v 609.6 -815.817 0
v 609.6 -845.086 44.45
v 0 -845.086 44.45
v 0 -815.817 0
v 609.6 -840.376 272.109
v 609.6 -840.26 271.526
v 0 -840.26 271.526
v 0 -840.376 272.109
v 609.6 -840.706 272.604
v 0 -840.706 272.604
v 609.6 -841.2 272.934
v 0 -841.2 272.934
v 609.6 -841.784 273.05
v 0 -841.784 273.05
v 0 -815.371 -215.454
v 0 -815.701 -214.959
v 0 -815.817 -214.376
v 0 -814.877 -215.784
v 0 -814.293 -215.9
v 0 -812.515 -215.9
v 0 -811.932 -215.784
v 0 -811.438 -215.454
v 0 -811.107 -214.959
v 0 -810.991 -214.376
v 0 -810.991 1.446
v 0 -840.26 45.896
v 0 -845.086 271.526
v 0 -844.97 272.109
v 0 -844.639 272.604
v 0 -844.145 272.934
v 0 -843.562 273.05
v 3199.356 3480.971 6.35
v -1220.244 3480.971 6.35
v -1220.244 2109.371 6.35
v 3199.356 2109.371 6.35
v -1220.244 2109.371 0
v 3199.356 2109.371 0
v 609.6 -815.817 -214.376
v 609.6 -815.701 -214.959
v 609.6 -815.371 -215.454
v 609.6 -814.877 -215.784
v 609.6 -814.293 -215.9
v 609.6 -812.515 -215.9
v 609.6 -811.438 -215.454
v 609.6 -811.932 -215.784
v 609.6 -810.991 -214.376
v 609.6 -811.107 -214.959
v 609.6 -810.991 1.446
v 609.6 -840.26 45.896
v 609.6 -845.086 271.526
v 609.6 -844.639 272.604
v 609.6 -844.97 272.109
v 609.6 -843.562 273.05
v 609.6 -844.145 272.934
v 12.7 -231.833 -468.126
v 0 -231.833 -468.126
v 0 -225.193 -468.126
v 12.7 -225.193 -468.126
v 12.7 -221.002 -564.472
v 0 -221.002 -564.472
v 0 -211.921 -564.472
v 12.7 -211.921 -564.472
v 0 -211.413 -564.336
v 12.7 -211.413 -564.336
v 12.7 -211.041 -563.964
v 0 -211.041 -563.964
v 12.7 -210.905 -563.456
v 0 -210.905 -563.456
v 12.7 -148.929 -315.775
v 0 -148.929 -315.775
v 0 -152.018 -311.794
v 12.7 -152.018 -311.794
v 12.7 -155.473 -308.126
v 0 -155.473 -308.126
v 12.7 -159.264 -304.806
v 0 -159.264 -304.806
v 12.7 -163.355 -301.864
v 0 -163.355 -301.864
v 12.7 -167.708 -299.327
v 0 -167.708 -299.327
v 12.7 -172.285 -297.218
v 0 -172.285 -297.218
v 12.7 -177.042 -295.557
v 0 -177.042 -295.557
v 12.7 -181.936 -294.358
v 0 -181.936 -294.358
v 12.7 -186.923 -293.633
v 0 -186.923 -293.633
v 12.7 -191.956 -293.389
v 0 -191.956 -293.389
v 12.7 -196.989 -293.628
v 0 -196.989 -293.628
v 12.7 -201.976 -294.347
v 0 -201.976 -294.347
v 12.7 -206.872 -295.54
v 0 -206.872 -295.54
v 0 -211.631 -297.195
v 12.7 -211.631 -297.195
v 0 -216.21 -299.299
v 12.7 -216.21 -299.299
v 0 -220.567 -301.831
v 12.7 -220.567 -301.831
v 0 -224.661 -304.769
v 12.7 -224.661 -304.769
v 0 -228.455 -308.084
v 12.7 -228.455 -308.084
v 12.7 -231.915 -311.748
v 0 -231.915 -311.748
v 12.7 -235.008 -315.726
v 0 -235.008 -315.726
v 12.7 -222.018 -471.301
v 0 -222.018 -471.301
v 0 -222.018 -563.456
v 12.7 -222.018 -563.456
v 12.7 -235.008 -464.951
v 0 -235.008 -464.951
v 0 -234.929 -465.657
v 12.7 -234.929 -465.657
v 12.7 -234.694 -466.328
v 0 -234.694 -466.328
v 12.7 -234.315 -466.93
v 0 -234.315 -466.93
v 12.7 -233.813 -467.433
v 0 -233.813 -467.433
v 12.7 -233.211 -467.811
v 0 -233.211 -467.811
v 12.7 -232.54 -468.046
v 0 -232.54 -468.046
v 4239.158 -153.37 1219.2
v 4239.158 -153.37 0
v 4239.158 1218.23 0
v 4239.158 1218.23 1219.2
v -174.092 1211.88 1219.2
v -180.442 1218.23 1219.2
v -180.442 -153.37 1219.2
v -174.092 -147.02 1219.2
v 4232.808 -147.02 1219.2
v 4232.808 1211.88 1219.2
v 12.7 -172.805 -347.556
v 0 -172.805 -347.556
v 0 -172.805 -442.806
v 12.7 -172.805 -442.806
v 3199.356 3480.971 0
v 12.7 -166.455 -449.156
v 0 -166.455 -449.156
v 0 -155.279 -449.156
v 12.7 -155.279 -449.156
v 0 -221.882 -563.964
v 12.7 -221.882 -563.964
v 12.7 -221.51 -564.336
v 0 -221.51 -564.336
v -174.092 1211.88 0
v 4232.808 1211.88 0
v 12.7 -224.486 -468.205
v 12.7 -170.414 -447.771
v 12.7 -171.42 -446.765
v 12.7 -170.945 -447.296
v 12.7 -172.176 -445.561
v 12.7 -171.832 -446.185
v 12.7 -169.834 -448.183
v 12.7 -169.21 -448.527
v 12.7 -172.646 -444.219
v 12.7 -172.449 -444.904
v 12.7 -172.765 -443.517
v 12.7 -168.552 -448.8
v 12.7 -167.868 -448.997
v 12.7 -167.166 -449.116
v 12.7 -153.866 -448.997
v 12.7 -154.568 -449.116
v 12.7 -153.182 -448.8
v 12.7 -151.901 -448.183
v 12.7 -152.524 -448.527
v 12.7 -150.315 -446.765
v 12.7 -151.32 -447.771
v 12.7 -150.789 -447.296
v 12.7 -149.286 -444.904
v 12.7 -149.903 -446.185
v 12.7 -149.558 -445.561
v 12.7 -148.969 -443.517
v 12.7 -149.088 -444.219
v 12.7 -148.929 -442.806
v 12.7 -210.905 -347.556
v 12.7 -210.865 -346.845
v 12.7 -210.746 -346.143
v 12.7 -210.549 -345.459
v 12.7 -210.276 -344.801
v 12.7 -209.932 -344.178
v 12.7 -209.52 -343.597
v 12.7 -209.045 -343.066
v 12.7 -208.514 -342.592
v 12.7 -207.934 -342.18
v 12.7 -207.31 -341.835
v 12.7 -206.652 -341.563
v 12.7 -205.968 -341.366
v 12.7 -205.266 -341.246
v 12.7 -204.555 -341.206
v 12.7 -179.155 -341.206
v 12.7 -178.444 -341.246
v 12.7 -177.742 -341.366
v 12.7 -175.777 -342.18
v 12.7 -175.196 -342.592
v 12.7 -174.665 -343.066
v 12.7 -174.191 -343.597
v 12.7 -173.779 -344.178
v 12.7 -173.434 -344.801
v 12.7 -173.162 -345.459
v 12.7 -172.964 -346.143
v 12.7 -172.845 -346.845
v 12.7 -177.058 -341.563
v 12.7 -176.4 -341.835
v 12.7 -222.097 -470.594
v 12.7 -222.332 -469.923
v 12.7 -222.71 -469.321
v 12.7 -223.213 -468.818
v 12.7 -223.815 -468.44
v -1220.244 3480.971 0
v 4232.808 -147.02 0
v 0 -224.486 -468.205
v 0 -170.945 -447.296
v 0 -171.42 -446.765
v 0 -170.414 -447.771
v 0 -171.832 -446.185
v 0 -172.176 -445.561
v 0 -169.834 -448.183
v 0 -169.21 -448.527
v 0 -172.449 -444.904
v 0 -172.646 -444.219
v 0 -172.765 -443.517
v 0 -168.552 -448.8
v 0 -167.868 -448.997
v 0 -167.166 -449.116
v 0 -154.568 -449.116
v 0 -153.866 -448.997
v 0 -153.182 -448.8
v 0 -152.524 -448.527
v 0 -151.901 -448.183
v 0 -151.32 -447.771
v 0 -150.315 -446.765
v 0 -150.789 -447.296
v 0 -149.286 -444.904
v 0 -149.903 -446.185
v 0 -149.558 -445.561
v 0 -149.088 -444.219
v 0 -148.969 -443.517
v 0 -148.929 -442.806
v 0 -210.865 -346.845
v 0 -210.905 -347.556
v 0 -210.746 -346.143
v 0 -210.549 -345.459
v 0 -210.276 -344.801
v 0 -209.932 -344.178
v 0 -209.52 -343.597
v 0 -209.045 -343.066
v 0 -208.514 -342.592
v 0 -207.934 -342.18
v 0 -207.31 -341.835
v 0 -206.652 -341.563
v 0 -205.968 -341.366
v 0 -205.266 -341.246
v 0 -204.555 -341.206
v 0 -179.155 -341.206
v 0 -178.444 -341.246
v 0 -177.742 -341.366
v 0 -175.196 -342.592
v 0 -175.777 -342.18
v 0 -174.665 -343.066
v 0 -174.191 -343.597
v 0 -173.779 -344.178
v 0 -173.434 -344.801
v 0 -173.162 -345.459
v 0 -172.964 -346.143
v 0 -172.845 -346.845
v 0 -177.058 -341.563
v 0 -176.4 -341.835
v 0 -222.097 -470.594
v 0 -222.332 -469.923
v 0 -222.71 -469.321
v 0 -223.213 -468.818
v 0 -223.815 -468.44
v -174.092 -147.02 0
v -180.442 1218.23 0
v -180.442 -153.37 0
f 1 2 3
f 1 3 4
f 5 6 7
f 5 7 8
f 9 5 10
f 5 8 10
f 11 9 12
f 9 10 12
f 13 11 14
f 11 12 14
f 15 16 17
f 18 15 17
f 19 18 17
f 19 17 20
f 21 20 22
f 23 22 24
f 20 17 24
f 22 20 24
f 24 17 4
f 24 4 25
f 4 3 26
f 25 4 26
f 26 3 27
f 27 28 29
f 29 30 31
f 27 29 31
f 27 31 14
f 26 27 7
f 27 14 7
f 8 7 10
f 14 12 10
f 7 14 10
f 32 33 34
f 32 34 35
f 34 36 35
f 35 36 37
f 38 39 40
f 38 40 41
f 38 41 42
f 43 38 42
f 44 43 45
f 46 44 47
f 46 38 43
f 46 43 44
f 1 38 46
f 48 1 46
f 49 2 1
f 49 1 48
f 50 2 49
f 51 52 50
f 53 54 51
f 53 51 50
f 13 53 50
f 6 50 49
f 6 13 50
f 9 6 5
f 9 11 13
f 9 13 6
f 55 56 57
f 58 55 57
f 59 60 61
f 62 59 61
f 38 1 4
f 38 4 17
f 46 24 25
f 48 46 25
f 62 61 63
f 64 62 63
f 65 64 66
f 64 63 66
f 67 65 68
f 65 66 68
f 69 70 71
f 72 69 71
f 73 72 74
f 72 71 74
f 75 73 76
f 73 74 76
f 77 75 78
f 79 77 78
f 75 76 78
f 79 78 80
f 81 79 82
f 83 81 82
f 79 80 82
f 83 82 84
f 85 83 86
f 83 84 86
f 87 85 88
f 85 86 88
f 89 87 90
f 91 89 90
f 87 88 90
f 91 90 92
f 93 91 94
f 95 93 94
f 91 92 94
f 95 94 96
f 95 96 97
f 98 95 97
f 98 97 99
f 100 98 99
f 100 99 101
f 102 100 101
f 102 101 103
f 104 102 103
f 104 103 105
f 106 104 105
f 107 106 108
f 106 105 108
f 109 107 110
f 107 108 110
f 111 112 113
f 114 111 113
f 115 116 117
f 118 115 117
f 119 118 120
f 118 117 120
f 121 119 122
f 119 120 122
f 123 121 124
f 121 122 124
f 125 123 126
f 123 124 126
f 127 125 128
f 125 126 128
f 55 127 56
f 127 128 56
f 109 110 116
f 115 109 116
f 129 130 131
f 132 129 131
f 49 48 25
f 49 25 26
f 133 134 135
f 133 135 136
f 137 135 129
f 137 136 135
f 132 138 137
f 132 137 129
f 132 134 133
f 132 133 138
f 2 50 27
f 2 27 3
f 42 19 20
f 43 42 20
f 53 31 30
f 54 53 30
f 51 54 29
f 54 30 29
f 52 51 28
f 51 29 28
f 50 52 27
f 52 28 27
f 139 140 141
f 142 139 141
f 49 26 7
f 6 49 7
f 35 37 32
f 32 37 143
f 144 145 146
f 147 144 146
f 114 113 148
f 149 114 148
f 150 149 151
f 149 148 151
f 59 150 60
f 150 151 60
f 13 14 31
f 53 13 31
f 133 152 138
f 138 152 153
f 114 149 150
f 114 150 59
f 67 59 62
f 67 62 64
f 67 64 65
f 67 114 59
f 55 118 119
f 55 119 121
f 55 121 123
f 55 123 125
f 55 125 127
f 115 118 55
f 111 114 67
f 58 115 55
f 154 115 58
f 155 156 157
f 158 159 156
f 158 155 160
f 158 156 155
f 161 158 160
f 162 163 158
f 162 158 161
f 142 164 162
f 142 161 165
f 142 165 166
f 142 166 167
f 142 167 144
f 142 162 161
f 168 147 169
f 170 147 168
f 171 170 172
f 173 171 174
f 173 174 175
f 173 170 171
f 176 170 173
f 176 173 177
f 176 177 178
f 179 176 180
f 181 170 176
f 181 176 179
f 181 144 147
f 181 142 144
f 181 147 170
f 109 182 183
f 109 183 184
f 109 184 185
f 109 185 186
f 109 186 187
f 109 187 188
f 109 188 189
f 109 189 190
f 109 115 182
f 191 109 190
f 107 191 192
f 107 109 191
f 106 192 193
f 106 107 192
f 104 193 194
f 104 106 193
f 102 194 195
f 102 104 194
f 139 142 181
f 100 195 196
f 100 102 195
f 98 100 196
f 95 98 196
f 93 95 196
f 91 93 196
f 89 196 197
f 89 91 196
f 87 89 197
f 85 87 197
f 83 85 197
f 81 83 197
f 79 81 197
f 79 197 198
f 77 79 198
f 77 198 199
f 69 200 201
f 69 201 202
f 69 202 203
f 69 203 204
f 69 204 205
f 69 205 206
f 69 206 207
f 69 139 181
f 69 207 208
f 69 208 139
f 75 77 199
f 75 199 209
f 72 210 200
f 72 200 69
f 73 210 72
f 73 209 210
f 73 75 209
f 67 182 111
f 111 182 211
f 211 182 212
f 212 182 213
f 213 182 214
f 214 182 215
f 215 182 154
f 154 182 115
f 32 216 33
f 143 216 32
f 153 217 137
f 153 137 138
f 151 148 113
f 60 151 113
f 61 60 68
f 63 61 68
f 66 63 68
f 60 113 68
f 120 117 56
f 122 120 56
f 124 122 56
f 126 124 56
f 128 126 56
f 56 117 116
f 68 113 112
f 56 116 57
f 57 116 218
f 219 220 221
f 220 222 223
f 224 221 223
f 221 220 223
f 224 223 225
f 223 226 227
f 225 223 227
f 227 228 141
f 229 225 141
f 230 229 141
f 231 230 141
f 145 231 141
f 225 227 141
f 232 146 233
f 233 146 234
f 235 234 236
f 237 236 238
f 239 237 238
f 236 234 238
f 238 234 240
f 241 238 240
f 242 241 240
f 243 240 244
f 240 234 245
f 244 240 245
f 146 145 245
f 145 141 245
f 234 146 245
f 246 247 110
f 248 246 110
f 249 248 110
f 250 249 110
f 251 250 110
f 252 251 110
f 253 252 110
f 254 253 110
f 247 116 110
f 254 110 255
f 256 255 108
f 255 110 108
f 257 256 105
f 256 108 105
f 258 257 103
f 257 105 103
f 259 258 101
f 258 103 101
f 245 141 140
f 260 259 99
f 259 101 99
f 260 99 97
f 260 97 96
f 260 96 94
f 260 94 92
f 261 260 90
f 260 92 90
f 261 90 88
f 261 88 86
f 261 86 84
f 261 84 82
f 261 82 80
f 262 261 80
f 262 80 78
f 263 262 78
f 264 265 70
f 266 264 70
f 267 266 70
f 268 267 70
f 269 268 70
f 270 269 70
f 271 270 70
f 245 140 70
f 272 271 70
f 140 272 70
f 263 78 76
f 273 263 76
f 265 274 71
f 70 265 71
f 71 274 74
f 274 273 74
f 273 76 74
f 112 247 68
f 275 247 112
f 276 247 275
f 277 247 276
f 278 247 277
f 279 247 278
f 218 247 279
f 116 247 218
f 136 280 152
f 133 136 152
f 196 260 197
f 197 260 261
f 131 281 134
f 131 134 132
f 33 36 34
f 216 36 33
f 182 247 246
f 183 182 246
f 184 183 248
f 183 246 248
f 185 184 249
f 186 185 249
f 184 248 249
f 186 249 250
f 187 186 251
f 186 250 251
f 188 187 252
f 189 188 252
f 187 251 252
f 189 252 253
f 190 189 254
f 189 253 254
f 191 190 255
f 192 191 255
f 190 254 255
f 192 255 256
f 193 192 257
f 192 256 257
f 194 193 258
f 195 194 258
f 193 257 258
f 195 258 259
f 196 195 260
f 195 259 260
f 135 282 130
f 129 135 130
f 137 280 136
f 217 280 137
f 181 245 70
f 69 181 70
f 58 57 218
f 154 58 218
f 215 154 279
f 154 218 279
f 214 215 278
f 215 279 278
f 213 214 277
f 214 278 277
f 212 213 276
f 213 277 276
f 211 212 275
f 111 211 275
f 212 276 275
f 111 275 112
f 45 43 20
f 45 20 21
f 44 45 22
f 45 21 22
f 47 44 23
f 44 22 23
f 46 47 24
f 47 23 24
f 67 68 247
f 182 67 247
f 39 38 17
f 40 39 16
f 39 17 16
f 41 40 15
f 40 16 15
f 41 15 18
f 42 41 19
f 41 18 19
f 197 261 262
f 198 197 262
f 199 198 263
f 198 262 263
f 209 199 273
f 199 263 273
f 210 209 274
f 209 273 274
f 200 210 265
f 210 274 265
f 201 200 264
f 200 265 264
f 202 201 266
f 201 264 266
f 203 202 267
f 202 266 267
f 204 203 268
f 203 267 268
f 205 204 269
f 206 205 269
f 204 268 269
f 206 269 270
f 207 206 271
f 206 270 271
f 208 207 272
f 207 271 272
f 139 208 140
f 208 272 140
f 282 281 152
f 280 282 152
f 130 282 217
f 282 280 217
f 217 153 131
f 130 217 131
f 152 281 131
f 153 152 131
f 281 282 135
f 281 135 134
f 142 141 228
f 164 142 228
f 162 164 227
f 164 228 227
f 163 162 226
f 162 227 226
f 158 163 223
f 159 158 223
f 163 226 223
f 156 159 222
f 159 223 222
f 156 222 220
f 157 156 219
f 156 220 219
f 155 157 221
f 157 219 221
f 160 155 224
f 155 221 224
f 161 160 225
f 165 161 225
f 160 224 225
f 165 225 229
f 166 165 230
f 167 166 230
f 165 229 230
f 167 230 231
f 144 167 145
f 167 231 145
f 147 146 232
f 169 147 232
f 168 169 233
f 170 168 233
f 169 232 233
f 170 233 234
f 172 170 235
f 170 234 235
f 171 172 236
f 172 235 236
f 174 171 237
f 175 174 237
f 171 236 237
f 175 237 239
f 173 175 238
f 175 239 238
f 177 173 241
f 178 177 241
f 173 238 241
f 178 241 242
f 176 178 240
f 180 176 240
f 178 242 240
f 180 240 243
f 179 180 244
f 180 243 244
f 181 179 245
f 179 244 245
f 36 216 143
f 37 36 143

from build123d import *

# Parameters (mm, degrees)
F0_W     = 4419.6
F0_H     = 1371.6
F0_W_2   = 4406.9
F0_H_2   = 1358.9
F1_DEPTH = 1219.2
F2_W     = 4419.6
F2_H     = 1371.6
F3_DEPTH = 6.35
F5_DEPTH = 609.6
F7_DEPTH = 12.7


with BuildPart() as f1:
    # F0 (on Top) → F1 (new body)
    with BuildSketch(Plane.XY):
        with Locations((2029.357997, 532.430415)):
            Rectangle(F0_W, F0_H)
        with Locations((2029.357997, 532.430415)):
            Rectangle(F0_W_2, F0_H_2, mode=Mode.SUBTRACT)
    extrude(amount=F1_DEPTH)


with BuildPart() as f3:
    # F2 (on Top) → F3 (new body)
    with BuildSketch(Plane.XY):
        with Locations((989.555538, 2795.171261)):
            Rectangle(F2_W, F2_H)
    extrude(amount=F3_DEPTH)


with BuildPart() as f5:
    # F4 (on Right) → F5 (new body)
    with BuildSketch(Plane.YZ):
        with BuildLine():
            Line((-815.817473, 0), (-815.817473, -214.376))
            ThreePointArc((-815.817473, -214.376), (-815.371104, -215.453631), (-814.293473, -215.9))
            Line((-814.293473, -215.9), (-812.515473, -215.9))
            ThreePointArc((-812.515473, -215.9), (-811.437842, -215.453631), (-810.991473, -214.376))
            Line((-810.991473, -214.376), (-810.991473, 1.446167))
            Line((-810.991473, 1.446167), (-840.259573, 45.896167))
            Line((-840.259573, 45.896167), (-840.259573, 271.526))
            ThreePointArc((-840.259573, 271.526), (-840.705942, 272.603631), (-841.783573, 273.05))
            Line((-841.783573, 273.05), (-843.561573, 273.05))
            ThreePointArc((-843.561573, 273.05), (-844.639203, 272.603631), (-845.085573, 271.526))
            Line((-845.085573, 271.526), (-845.085573, 44.45))
            Line((-845.085573, 44.45), (-815.817473, 0))
        make_face()
    extrude(amount=F5_DEPTH)


with BuildPart() as f7:
    # F6 (on Right) → F7 (new body)
    with BuildSketch(Plane.YZ):
        with BuildLine():
            ThreePointArc((-222.017714, -563.456333), (-221.720134, -564.174753), (-221.001714, -564.472333))
            Line((-221.001714, -564.472333), (-211.921214, -564.472333))
            ThreePointArc((-211.921214, -564.472333), (-211.202793, -564.174753), (-210.905214, -563.456333))
            Line((-210.905214, -563.456333), (-210.905214, -347.556333))
            ThreePointArc((-210.905214, -347.556333), (-209.045342, -343.066205), (-204.555214, -341.206333))
            Line((-204.555214, -341.206333), (-179.155214, -341.206333))
            ThreePointArc((-179.155214, -341.206333), (-174.665086, -343.066205), (-172.805214, -347.556333))
            Line((-172.805214, -347.556333), (-172.805214, -442.806333))
            ThreePointArc((-172.805214, -442.806333), (-170.945342, -447.296461), (-166.455214, -449.156333))
            Line((-166.455214, -449.156333), (-155.279214, -449.156333))
            ThreePointArc((-155.279214, -449.156333), (-150.789086, -447.296461), (-148.929214, -442.806333))
            Line((-148.929214, -442.806333), (-148.929214, -341.206333))
            Line((-148.929214, -341.206333), (-148.929214, -315.7751))
            ThreePointArc((-148.929214, -315.7751), (-191.955815, -293.389133), (-235.008121, -315.725624))
            Line((-235.008121, -315.725624), (-235.008121, -464.950624))
            ThreePointArc((-235.008121, -464.950624), (-234.078185, -467.195688), (-231.833121, -468.125624))
            Line((-231.833121, -468.125624), (-225.192714, -468.125624))
            ThreePointArc((-225.192714, -468.125624), (-222.94765, -469.05556), (-222.017714, -471.300624))
            Line((-222.017714, -471.300624), (-222.017714, -563.456333))
        make_face()
    extrude(amount=F7_DEPTH)


solid = Compound([f1.part, f3.part, f5.part, f7.part])
